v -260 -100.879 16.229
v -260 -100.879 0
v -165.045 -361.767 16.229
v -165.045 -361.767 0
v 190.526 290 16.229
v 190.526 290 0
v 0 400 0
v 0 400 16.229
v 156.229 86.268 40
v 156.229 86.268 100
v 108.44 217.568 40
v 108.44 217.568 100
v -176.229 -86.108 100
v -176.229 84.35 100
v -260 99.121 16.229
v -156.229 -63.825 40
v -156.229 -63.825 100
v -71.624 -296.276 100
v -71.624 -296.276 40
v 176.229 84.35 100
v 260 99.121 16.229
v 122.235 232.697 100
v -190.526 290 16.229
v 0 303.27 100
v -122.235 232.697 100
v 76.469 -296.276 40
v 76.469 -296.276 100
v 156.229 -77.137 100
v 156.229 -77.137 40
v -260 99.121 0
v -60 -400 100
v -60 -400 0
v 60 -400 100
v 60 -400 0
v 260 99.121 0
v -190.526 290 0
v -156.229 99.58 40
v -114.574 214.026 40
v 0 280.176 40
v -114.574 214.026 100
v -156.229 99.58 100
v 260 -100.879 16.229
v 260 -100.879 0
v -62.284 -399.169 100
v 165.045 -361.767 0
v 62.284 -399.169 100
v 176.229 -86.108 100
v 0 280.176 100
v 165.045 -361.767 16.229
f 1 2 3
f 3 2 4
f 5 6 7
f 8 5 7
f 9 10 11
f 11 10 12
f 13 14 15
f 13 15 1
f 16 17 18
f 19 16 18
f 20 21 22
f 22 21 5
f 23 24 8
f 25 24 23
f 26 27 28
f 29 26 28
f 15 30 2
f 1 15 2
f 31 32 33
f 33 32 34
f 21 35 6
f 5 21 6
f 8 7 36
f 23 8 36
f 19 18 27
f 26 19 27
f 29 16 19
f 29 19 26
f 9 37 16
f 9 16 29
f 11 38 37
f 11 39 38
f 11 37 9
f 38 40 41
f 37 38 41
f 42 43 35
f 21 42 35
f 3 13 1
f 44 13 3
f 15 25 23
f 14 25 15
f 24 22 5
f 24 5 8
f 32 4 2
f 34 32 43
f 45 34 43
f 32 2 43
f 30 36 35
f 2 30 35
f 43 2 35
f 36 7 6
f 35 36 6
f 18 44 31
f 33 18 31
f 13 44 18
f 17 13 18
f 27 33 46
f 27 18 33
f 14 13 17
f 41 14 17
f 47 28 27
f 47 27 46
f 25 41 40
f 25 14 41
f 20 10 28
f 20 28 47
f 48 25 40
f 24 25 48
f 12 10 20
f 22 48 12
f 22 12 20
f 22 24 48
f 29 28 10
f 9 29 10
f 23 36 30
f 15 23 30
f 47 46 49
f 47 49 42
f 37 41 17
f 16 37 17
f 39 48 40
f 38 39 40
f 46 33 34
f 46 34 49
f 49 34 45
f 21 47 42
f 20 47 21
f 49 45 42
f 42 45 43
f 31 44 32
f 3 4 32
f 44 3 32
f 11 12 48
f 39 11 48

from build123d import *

# Parameters (mm, degrees)
F1_DEPTH = 10
F2_DEPTH = 90
F3_SIZE2 = 83.771
F3_SIZE  = 83.771
F5_DEPTH = 60


# Not quite as in the source:
# - a feature names something its author has since deleted; it is built from what else it names


with BuildPart() as f1:
    # F0 (on Top) → F1 (new body)
    with BuildSketch(Plane.XY):
        Polygon((190.5255888326, 290), (0, 400), (-190.5255888326, 290), (-260, 99.1206240876), (-260, -100.8793759124), (-165.0447262585, -361.7668463753), (-60, -400), (60, -400), (165.0447262585, -361.7668463753), (260, -100.8793759124), (260, 99.1206240876), align=None)
    extrude(amount=F1_DEPTH)

    # F2 (add): a face of the model
    f2_faces = [f1.faces().sort_by_distance(p)[0] for p in [
        (0, -14.4086757736, 10),
    ]]
    extrude(f2_faces, amount=F2_DEPTH)

    # F3
    f3_edges = [f1.edges().sort_by_distance(p)[0] for p in [
        (-212.522363, -231.323111, 100),
        (212.522363, -231.323111, 100),
        (260, -0.879376, 100),
        (225.262794, 194.560312, 100),
        (95.262794, 345, 100),
        (-95.262794, 345, 100),
        (-225.262794, 194.560312, 100),
        (-260, -0.879376, 100),
    ]]
    chamfer(f3_edges, length=F3_SIZE, length2=F3_SIZE2)

    # F4 (on face) → F5 (cut)
    with BuildSketch(Plane.XY.offset(100)):
        Polygon((-114.5740551886, 214.0262088265), (-156.229, 99.5801885487), (-156.229, -63.8245572211), (-71.6236926582, -296.2757287087), (76.4689935111, -296.2757287087), (156.229, -77.136911905), (156.229, 86.2678338648), (108.4396889686, 217.567886815), (0, 280.1755704318), align=None)
    extrude(amount=-F5_DEPTH, mode=Mode.SUBTRACT)


solid = f1.part
